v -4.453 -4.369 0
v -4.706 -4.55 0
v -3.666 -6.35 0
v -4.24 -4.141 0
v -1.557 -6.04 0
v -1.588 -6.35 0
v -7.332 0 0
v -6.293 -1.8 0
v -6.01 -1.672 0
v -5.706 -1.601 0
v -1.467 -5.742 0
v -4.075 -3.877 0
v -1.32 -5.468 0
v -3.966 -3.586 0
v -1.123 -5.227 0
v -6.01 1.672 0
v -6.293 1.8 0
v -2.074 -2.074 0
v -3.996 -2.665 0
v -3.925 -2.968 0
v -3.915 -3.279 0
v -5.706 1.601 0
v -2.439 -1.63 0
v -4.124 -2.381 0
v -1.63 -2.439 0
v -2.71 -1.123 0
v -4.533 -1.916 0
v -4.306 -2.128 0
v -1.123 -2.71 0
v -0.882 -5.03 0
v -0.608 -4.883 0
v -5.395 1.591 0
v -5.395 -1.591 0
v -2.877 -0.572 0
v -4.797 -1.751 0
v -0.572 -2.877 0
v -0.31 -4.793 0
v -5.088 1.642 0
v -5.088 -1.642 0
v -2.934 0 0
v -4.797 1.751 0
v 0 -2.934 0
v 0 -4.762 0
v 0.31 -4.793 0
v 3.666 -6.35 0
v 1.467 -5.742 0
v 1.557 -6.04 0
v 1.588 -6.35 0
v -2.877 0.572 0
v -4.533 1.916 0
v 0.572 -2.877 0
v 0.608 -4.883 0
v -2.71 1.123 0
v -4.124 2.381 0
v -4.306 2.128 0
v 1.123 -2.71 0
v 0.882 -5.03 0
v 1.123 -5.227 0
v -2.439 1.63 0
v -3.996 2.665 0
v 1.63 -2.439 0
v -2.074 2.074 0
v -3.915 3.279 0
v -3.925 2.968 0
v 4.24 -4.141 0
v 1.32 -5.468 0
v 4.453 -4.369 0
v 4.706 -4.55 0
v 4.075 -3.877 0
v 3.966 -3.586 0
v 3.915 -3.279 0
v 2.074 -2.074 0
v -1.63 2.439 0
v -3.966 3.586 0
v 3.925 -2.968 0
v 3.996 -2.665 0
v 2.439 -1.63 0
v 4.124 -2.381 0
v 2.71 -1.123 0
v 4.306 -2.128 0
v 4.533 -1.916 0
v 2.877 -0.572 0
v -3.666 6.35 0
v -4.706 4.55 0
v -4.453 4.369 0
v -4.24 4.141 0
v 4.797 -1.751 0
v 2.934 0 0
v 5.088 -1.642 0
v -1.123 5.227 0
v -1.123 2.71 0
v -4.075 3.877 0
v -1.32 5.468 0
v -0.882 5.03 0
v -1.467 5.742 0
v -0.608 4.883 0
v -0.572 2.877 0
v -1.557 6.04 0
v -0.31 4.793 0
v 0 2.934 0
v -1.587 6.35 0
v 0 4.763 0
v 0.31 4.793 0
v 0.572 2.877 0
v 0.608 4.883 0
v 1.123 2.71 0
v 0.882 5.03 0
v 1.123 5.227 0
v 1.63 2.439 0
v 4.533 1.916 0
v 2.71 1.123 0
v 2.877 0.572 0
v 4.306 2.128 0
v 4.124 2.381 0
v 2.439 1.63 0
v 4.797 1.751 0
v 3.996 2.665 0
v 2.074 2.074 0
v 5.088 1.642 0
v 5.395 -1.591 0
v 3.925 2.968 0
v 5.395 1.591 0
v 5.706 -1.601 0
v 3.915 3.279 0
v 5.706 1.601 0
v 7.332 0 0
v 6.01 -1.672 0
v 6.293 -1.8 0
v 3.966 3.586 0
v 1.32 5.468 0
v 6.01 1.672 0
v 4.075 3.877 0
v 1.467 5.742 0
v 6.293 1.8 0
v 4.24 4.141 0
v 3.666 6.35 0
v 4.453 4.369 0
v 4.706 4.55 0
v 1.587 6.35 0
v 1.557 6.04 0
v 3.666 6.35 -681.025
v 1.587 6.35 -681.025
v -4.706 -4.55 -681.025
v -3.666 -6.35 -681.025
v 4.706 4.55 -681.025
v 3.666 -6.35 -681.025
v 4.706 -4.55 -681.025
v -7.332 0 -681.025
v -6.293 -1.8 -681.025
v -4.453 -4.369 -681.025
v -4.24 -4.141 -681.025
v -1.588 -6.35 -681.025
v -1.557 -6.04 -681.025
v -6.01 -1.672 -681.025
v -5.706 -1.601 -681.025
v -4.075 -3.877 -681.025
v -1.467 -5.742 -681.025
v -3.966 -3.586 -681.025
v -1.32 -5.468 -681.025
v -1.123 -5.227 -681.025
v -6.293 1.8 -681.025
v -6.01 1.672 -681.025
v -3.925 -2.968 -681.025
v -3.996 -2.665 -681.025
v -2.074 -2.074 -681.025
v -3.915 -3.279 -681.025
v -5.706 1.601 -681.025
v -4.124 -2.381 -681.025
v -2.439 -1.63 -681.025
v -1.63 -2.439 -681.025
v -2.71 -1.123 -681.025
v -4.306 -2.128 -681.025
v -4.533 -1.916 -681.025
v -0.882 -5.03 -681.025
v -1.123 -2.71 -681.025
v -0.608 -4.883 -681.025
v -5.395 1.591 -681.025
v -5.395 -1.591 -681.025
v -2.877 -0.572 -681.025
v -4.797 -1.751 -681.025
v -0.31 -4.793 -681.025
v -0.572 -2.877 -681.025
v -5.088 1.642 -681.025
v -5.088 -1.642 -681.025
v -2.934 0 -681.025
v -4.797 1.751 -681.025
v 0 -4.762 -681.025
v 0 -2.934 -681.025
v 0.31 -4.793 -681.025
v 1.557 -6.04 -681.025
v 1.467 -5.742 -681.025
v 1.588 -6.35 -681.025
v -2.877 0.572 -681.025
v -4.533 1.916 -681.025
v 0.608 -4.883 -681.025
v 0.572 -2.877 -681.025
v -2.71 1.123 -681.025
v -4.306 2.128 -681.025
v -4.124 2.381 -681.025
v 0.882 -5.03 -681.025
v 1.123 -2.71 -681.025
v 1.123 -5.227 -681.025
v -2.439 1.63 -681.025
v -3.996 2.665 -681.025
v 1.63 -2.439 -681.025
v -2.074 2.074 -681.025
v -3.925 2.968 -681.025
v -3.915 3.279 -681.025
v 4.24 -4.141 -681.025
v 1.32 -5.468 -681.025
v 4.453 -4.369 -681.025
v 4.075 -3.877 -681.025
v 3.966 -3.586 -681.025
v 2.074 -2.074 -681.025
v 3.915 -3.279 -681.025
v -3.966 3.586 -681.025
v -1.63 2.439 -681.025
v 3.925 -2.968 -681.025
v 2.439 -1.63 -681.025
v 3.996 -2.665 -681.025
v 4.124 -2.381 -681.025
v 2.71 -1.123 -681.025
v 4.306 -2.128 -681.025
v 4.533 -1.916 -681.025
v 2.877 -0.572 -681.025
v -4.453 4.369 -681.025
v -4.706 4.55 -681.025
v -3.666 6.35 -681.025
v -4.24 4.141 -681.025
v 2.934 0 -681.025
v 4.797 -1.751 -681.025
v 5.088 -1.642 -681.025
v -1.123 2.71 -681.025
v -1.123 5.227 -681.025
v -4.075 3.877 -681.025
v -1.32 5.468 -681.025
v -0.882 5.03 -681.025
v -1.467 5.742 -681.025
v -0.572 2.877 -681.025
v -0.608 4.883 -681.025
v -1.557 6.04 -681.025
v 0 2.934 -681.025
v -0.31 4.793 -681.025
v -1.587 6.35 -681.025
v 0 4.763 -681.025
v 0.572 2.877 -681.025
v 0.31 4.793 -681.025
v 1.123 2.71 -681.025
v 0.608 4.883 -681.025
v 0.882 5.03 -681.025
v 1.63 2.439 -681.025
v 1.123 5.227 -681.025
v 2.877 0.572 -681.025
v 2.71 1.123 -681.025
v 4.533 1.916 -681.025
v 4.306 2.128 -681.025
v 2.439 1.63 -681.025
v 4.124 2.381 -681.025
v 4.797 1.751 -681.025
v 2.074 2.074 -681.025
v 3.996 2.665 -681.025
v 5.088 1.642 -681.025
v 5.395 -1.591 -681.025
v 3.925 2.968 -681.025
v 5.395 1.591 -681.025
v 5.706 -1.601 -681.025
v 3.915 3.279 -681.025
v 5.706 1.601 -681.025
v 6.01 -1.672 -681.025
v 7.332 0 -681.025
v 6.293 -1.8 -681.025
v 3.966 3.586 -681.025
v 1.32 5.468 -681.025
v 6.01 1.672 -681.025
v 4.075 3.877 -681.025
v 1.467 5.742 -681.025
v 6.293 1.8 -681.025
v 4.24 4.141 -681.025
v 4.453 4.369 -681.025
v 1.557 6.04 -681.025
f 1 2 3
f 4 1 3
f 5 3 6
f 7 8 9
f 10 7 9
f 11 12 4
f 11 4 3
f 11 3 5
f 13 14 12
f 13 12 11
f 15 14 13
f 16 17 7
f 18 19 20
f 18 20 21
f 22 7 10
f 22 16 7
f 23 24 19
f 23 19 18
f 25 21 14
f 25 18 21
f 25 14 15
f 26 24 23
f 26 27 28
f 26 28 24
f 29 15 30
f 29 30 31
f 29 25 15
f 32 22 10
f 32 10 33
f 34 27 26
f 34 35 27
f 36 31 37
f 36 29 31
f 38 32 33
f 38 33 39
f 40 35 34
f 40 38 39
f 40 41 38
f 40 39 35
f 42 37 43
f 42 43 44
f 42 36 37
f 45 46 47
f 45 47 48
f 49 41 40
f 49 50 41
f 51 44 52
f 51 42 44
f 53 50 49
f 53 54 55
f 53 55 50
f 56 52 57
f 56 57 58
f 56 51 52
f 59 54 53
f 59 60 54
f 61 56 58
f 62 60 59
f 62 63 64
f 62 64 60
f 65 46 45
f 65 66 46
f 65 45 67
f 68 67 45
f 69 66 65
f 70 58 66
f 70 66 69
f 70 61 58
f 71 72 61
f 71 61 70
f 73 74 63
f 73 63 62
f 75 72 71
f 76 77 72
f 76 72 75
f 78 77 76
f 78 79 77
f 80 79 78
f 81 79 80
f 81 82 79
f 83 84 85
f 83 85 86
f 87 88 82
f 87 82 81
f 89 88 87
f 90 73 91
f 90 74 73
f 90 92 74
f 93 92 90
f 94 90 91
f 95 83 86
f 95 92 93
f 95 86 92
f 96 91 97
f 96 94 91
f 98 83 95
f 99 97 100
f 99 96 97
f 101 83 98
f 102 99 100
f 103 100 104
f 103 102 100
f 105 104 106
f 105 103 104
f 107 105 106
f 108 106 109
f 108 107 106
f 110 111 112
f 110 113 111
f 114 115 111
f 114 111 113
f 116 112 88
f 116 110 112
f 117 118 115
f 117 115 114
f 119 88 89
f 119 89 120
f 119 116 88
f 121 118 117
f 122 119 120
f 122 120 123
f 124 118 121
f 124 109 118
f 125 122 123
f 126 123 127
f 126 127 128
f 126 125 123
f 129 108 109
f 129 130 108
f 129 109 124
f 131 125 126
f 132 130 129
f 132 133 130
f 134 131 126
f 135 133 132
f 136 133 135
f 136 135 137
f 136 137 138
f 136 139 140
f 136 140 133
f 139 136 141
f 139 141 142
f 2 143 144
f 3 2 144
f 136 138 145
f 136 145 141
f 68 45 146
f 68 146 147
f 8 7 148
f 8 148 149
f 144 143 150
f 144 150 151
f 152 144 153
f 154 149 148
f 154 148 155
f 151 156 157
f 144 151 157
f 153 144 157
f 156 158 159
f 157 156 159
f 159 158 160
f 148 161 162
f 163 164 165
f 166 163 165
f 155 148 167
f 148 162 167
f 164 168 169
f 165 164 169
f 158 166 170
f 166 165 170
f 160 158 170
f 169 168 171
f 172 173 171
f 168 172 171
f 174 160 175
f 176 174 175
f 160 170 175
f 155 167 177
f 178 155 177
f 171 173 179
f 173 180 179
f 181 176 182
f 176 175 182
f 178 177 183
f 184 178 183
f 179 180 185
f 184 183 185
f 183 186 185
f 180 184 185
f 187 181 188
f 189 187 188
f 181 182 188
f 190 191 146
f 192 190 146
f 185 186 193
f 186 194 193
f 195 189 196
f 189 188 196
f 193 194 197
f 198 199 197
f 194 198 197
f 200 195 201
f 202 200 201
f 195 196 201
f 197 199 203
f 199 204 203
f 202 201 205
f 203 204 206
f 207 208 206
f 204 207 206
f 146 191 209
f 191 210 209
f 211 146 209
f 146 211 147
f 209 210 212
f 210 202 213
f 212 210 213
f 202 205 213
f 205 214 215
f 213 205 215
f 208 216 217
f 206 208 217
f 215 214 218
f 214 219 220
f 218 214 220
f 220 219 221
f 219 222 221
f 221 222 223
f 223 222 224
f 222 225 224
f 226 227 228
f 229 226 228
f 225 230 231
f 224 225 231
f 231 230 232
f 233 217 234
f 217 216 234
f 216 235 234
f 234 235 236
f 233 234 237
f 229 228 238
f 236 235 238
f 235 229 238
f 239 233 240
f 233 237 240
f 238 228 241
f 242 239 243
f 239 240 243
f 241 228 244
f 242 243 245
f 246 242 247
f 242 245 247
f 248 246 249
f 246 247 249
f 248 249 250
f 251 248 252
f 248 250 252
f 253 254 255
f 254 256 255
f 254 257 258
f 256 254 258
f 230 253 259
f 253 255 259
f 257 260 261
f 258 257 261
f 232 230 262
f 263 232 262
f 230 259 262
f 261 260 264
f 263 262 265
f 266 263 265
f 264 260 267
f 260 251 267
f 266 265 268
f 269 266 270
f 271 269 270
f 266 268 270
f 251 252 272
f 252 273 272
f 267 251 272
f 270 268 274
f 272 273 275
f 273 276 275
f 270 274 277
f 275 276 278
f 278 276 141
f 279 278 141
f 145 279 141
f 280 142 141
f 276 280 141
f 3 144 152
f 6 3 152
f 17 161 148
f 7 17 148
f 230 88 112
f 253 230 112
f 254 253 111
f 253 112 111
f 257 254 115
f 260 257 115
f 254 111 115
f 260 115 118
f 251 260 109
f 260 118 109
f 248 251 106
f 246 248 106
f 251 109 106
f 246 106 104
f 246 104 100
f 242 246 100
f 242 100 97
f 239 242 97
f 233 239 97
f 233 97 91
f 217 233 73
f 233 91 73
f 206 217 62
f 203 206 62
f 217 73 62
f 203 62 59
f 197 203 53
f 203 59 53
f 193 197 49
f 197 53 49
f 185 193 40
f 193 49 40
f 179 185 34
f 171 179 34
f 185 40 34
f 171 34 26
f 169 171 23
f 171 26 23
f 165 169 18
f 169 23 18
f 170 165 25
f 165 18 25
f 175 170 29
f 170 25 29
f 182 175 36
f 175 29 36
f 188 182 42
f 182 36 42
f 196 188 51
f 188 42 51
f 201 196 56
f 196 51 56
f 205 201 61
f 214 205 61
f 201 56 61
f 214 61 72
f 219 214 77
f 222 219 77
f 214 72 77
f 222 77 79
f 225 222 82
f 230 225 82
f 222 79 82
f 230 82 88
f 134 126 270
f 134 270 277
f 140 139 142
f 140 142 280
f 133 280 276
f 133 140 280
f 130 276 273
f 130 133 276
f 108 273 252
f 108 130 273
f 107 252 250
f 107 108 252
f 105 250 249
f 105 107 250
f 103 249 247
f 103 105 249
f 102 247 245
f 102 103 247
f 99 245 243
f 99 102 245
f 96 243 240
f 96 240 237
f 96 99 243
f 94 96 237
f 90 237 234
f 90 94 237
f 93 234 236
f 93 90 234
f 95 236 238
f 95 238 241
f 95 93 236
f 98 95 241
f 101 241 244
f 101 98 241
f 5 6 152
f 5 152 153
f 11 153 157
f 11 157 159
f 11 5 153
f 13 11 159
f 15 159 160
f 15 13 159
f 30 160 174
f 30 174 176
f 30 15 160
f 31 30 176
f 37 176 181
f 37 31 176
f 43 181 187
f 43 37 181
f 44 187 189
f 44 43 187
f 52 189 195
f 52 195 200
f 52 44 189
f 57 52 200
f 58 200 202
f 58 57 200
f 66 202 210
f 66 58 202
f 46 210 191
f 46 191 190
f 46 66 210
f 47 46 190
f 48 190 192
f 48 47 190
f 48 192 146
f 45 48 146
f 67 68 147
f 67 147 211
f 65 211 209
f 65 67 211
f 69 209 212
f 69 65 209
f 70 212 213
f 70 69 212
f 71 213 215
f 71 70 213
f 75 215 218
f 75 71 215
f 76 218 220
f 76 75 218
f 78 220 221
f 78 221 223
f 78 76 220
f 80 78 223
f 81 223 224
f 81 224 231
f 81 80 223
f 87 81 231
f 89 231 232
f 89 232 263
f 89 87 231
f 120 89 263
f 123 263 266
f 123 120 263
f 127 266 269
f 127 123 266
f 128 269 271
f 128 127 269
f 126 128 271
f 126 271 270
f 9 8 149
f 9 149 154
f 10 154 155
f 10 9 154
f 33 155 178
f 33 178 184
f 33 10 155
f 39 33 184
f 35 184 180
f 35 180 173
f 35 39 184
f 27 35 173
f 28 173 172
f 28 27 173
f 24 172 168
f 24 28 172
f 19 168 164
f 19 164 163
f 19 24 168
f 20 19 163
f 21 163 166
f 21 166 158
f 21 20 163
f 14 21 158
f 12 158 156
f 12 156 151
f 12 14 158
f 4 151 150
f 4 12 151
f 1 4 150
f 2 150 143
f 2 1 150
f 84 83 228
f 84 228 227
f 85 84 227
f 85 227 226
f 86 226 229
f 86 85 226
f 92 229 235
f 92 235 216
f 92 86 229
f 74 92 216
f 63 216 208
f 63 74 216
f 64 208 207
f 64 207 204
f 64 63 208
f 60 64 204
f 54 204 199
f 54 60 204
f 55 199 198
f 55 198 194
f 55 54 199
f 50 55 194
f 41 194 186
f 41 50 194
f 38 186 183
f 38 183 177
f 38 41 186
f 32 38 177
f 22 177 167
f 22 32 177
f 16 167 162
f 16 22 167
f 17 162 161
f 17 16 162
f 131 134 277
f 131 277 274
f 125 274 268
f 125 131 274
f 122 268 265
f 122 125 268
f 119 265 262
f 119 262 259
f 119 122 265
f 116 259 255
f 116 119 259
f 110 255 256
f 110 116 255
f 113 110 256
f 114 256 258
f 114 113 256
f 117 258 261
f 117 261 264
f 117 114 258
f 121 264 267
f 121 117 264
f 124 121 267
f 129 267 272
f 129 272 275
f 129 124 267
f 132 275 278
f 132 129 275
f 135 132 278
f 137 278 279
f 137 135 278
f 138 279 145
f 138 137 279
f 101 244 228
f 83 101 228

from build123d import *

# Parameters (mm, degrees)
SKETCH1_R           = 2.9337
BOSS_EXTRUDE1_DEPTH = 681.0248


with BuildPart() as part:
    # Sketch1 → Boss-Extrude1 (new body)
    with BuildSketch(Plane.XY):
        with BuildLine():
            Line((-4.70551159, -4.549815043), (-3.666174521, -6.349999904))
            Line((-3.666174521, -6.349999904), (-1.587501154, -6.349999904))
            ThreePointArc((-1.587501154, -6.349999904), (-3.85e-07, -4.762499134), (1.587501154, -6.349999904))
            Line((1.587501154, -6.349999904), (3.666173825, -6.349999904))
            Line((3.666173825, -6.349999904), (4.705510929, -4.549815232))
            ThreePointArc((4.705510929, -4.549815232), (4.124445601, -2.381249904), (6.293010929, -1.800184575))
            Line((6.293010929, -1.800184575), (7.332348034, 9.6e-08))
            Line((7.332348034, 9.6e-08), (6.293011178, 1.800184715))
            ThreePointArc((6.293011178, 1.800184715), (4.124445902, 2.381250241), (4.705511428, 4.549815516))
            Line((4.705511428, 4.549815516), (3.666174521, 6.350000222))
            Line((3.666174521, 6.350000222), (1.587498846, 6.350000222))
            ThreePointArc((1.587498846, 6.350000222), (3.85e-07, 4.762501761), (-1.587498846, 6.350000222))
            Line((-1.587498846, 6.350000222), (-3.666173825, 6.350000222))
            Line((-3.666173825, 6.350000222), (-4.705511038, 4.549815614))
            ThreePointArc((-4.705511038, 4.549815614), (-4.124445841, 2.38125025), (-6.293011205, 1.800185053))
            Line((-6.293011205, 1.800185053), (-7.332348419, 4.44e-07))
            Line((-7.332348419, 4.44e-07), (-6.293011423, -1.80018429))
            ThreePointArc((-6.293011423, -1.80018429), (-4.12444613, -2.38124975), (-4.70551159, -4.549815043))
        make_face()
        Circle(SKETCH1_R, mode=Mode.SUBTRACT)
    extrude(amount=-BOSS_EXTRUDE1_DEPTH)


solid = part.part
